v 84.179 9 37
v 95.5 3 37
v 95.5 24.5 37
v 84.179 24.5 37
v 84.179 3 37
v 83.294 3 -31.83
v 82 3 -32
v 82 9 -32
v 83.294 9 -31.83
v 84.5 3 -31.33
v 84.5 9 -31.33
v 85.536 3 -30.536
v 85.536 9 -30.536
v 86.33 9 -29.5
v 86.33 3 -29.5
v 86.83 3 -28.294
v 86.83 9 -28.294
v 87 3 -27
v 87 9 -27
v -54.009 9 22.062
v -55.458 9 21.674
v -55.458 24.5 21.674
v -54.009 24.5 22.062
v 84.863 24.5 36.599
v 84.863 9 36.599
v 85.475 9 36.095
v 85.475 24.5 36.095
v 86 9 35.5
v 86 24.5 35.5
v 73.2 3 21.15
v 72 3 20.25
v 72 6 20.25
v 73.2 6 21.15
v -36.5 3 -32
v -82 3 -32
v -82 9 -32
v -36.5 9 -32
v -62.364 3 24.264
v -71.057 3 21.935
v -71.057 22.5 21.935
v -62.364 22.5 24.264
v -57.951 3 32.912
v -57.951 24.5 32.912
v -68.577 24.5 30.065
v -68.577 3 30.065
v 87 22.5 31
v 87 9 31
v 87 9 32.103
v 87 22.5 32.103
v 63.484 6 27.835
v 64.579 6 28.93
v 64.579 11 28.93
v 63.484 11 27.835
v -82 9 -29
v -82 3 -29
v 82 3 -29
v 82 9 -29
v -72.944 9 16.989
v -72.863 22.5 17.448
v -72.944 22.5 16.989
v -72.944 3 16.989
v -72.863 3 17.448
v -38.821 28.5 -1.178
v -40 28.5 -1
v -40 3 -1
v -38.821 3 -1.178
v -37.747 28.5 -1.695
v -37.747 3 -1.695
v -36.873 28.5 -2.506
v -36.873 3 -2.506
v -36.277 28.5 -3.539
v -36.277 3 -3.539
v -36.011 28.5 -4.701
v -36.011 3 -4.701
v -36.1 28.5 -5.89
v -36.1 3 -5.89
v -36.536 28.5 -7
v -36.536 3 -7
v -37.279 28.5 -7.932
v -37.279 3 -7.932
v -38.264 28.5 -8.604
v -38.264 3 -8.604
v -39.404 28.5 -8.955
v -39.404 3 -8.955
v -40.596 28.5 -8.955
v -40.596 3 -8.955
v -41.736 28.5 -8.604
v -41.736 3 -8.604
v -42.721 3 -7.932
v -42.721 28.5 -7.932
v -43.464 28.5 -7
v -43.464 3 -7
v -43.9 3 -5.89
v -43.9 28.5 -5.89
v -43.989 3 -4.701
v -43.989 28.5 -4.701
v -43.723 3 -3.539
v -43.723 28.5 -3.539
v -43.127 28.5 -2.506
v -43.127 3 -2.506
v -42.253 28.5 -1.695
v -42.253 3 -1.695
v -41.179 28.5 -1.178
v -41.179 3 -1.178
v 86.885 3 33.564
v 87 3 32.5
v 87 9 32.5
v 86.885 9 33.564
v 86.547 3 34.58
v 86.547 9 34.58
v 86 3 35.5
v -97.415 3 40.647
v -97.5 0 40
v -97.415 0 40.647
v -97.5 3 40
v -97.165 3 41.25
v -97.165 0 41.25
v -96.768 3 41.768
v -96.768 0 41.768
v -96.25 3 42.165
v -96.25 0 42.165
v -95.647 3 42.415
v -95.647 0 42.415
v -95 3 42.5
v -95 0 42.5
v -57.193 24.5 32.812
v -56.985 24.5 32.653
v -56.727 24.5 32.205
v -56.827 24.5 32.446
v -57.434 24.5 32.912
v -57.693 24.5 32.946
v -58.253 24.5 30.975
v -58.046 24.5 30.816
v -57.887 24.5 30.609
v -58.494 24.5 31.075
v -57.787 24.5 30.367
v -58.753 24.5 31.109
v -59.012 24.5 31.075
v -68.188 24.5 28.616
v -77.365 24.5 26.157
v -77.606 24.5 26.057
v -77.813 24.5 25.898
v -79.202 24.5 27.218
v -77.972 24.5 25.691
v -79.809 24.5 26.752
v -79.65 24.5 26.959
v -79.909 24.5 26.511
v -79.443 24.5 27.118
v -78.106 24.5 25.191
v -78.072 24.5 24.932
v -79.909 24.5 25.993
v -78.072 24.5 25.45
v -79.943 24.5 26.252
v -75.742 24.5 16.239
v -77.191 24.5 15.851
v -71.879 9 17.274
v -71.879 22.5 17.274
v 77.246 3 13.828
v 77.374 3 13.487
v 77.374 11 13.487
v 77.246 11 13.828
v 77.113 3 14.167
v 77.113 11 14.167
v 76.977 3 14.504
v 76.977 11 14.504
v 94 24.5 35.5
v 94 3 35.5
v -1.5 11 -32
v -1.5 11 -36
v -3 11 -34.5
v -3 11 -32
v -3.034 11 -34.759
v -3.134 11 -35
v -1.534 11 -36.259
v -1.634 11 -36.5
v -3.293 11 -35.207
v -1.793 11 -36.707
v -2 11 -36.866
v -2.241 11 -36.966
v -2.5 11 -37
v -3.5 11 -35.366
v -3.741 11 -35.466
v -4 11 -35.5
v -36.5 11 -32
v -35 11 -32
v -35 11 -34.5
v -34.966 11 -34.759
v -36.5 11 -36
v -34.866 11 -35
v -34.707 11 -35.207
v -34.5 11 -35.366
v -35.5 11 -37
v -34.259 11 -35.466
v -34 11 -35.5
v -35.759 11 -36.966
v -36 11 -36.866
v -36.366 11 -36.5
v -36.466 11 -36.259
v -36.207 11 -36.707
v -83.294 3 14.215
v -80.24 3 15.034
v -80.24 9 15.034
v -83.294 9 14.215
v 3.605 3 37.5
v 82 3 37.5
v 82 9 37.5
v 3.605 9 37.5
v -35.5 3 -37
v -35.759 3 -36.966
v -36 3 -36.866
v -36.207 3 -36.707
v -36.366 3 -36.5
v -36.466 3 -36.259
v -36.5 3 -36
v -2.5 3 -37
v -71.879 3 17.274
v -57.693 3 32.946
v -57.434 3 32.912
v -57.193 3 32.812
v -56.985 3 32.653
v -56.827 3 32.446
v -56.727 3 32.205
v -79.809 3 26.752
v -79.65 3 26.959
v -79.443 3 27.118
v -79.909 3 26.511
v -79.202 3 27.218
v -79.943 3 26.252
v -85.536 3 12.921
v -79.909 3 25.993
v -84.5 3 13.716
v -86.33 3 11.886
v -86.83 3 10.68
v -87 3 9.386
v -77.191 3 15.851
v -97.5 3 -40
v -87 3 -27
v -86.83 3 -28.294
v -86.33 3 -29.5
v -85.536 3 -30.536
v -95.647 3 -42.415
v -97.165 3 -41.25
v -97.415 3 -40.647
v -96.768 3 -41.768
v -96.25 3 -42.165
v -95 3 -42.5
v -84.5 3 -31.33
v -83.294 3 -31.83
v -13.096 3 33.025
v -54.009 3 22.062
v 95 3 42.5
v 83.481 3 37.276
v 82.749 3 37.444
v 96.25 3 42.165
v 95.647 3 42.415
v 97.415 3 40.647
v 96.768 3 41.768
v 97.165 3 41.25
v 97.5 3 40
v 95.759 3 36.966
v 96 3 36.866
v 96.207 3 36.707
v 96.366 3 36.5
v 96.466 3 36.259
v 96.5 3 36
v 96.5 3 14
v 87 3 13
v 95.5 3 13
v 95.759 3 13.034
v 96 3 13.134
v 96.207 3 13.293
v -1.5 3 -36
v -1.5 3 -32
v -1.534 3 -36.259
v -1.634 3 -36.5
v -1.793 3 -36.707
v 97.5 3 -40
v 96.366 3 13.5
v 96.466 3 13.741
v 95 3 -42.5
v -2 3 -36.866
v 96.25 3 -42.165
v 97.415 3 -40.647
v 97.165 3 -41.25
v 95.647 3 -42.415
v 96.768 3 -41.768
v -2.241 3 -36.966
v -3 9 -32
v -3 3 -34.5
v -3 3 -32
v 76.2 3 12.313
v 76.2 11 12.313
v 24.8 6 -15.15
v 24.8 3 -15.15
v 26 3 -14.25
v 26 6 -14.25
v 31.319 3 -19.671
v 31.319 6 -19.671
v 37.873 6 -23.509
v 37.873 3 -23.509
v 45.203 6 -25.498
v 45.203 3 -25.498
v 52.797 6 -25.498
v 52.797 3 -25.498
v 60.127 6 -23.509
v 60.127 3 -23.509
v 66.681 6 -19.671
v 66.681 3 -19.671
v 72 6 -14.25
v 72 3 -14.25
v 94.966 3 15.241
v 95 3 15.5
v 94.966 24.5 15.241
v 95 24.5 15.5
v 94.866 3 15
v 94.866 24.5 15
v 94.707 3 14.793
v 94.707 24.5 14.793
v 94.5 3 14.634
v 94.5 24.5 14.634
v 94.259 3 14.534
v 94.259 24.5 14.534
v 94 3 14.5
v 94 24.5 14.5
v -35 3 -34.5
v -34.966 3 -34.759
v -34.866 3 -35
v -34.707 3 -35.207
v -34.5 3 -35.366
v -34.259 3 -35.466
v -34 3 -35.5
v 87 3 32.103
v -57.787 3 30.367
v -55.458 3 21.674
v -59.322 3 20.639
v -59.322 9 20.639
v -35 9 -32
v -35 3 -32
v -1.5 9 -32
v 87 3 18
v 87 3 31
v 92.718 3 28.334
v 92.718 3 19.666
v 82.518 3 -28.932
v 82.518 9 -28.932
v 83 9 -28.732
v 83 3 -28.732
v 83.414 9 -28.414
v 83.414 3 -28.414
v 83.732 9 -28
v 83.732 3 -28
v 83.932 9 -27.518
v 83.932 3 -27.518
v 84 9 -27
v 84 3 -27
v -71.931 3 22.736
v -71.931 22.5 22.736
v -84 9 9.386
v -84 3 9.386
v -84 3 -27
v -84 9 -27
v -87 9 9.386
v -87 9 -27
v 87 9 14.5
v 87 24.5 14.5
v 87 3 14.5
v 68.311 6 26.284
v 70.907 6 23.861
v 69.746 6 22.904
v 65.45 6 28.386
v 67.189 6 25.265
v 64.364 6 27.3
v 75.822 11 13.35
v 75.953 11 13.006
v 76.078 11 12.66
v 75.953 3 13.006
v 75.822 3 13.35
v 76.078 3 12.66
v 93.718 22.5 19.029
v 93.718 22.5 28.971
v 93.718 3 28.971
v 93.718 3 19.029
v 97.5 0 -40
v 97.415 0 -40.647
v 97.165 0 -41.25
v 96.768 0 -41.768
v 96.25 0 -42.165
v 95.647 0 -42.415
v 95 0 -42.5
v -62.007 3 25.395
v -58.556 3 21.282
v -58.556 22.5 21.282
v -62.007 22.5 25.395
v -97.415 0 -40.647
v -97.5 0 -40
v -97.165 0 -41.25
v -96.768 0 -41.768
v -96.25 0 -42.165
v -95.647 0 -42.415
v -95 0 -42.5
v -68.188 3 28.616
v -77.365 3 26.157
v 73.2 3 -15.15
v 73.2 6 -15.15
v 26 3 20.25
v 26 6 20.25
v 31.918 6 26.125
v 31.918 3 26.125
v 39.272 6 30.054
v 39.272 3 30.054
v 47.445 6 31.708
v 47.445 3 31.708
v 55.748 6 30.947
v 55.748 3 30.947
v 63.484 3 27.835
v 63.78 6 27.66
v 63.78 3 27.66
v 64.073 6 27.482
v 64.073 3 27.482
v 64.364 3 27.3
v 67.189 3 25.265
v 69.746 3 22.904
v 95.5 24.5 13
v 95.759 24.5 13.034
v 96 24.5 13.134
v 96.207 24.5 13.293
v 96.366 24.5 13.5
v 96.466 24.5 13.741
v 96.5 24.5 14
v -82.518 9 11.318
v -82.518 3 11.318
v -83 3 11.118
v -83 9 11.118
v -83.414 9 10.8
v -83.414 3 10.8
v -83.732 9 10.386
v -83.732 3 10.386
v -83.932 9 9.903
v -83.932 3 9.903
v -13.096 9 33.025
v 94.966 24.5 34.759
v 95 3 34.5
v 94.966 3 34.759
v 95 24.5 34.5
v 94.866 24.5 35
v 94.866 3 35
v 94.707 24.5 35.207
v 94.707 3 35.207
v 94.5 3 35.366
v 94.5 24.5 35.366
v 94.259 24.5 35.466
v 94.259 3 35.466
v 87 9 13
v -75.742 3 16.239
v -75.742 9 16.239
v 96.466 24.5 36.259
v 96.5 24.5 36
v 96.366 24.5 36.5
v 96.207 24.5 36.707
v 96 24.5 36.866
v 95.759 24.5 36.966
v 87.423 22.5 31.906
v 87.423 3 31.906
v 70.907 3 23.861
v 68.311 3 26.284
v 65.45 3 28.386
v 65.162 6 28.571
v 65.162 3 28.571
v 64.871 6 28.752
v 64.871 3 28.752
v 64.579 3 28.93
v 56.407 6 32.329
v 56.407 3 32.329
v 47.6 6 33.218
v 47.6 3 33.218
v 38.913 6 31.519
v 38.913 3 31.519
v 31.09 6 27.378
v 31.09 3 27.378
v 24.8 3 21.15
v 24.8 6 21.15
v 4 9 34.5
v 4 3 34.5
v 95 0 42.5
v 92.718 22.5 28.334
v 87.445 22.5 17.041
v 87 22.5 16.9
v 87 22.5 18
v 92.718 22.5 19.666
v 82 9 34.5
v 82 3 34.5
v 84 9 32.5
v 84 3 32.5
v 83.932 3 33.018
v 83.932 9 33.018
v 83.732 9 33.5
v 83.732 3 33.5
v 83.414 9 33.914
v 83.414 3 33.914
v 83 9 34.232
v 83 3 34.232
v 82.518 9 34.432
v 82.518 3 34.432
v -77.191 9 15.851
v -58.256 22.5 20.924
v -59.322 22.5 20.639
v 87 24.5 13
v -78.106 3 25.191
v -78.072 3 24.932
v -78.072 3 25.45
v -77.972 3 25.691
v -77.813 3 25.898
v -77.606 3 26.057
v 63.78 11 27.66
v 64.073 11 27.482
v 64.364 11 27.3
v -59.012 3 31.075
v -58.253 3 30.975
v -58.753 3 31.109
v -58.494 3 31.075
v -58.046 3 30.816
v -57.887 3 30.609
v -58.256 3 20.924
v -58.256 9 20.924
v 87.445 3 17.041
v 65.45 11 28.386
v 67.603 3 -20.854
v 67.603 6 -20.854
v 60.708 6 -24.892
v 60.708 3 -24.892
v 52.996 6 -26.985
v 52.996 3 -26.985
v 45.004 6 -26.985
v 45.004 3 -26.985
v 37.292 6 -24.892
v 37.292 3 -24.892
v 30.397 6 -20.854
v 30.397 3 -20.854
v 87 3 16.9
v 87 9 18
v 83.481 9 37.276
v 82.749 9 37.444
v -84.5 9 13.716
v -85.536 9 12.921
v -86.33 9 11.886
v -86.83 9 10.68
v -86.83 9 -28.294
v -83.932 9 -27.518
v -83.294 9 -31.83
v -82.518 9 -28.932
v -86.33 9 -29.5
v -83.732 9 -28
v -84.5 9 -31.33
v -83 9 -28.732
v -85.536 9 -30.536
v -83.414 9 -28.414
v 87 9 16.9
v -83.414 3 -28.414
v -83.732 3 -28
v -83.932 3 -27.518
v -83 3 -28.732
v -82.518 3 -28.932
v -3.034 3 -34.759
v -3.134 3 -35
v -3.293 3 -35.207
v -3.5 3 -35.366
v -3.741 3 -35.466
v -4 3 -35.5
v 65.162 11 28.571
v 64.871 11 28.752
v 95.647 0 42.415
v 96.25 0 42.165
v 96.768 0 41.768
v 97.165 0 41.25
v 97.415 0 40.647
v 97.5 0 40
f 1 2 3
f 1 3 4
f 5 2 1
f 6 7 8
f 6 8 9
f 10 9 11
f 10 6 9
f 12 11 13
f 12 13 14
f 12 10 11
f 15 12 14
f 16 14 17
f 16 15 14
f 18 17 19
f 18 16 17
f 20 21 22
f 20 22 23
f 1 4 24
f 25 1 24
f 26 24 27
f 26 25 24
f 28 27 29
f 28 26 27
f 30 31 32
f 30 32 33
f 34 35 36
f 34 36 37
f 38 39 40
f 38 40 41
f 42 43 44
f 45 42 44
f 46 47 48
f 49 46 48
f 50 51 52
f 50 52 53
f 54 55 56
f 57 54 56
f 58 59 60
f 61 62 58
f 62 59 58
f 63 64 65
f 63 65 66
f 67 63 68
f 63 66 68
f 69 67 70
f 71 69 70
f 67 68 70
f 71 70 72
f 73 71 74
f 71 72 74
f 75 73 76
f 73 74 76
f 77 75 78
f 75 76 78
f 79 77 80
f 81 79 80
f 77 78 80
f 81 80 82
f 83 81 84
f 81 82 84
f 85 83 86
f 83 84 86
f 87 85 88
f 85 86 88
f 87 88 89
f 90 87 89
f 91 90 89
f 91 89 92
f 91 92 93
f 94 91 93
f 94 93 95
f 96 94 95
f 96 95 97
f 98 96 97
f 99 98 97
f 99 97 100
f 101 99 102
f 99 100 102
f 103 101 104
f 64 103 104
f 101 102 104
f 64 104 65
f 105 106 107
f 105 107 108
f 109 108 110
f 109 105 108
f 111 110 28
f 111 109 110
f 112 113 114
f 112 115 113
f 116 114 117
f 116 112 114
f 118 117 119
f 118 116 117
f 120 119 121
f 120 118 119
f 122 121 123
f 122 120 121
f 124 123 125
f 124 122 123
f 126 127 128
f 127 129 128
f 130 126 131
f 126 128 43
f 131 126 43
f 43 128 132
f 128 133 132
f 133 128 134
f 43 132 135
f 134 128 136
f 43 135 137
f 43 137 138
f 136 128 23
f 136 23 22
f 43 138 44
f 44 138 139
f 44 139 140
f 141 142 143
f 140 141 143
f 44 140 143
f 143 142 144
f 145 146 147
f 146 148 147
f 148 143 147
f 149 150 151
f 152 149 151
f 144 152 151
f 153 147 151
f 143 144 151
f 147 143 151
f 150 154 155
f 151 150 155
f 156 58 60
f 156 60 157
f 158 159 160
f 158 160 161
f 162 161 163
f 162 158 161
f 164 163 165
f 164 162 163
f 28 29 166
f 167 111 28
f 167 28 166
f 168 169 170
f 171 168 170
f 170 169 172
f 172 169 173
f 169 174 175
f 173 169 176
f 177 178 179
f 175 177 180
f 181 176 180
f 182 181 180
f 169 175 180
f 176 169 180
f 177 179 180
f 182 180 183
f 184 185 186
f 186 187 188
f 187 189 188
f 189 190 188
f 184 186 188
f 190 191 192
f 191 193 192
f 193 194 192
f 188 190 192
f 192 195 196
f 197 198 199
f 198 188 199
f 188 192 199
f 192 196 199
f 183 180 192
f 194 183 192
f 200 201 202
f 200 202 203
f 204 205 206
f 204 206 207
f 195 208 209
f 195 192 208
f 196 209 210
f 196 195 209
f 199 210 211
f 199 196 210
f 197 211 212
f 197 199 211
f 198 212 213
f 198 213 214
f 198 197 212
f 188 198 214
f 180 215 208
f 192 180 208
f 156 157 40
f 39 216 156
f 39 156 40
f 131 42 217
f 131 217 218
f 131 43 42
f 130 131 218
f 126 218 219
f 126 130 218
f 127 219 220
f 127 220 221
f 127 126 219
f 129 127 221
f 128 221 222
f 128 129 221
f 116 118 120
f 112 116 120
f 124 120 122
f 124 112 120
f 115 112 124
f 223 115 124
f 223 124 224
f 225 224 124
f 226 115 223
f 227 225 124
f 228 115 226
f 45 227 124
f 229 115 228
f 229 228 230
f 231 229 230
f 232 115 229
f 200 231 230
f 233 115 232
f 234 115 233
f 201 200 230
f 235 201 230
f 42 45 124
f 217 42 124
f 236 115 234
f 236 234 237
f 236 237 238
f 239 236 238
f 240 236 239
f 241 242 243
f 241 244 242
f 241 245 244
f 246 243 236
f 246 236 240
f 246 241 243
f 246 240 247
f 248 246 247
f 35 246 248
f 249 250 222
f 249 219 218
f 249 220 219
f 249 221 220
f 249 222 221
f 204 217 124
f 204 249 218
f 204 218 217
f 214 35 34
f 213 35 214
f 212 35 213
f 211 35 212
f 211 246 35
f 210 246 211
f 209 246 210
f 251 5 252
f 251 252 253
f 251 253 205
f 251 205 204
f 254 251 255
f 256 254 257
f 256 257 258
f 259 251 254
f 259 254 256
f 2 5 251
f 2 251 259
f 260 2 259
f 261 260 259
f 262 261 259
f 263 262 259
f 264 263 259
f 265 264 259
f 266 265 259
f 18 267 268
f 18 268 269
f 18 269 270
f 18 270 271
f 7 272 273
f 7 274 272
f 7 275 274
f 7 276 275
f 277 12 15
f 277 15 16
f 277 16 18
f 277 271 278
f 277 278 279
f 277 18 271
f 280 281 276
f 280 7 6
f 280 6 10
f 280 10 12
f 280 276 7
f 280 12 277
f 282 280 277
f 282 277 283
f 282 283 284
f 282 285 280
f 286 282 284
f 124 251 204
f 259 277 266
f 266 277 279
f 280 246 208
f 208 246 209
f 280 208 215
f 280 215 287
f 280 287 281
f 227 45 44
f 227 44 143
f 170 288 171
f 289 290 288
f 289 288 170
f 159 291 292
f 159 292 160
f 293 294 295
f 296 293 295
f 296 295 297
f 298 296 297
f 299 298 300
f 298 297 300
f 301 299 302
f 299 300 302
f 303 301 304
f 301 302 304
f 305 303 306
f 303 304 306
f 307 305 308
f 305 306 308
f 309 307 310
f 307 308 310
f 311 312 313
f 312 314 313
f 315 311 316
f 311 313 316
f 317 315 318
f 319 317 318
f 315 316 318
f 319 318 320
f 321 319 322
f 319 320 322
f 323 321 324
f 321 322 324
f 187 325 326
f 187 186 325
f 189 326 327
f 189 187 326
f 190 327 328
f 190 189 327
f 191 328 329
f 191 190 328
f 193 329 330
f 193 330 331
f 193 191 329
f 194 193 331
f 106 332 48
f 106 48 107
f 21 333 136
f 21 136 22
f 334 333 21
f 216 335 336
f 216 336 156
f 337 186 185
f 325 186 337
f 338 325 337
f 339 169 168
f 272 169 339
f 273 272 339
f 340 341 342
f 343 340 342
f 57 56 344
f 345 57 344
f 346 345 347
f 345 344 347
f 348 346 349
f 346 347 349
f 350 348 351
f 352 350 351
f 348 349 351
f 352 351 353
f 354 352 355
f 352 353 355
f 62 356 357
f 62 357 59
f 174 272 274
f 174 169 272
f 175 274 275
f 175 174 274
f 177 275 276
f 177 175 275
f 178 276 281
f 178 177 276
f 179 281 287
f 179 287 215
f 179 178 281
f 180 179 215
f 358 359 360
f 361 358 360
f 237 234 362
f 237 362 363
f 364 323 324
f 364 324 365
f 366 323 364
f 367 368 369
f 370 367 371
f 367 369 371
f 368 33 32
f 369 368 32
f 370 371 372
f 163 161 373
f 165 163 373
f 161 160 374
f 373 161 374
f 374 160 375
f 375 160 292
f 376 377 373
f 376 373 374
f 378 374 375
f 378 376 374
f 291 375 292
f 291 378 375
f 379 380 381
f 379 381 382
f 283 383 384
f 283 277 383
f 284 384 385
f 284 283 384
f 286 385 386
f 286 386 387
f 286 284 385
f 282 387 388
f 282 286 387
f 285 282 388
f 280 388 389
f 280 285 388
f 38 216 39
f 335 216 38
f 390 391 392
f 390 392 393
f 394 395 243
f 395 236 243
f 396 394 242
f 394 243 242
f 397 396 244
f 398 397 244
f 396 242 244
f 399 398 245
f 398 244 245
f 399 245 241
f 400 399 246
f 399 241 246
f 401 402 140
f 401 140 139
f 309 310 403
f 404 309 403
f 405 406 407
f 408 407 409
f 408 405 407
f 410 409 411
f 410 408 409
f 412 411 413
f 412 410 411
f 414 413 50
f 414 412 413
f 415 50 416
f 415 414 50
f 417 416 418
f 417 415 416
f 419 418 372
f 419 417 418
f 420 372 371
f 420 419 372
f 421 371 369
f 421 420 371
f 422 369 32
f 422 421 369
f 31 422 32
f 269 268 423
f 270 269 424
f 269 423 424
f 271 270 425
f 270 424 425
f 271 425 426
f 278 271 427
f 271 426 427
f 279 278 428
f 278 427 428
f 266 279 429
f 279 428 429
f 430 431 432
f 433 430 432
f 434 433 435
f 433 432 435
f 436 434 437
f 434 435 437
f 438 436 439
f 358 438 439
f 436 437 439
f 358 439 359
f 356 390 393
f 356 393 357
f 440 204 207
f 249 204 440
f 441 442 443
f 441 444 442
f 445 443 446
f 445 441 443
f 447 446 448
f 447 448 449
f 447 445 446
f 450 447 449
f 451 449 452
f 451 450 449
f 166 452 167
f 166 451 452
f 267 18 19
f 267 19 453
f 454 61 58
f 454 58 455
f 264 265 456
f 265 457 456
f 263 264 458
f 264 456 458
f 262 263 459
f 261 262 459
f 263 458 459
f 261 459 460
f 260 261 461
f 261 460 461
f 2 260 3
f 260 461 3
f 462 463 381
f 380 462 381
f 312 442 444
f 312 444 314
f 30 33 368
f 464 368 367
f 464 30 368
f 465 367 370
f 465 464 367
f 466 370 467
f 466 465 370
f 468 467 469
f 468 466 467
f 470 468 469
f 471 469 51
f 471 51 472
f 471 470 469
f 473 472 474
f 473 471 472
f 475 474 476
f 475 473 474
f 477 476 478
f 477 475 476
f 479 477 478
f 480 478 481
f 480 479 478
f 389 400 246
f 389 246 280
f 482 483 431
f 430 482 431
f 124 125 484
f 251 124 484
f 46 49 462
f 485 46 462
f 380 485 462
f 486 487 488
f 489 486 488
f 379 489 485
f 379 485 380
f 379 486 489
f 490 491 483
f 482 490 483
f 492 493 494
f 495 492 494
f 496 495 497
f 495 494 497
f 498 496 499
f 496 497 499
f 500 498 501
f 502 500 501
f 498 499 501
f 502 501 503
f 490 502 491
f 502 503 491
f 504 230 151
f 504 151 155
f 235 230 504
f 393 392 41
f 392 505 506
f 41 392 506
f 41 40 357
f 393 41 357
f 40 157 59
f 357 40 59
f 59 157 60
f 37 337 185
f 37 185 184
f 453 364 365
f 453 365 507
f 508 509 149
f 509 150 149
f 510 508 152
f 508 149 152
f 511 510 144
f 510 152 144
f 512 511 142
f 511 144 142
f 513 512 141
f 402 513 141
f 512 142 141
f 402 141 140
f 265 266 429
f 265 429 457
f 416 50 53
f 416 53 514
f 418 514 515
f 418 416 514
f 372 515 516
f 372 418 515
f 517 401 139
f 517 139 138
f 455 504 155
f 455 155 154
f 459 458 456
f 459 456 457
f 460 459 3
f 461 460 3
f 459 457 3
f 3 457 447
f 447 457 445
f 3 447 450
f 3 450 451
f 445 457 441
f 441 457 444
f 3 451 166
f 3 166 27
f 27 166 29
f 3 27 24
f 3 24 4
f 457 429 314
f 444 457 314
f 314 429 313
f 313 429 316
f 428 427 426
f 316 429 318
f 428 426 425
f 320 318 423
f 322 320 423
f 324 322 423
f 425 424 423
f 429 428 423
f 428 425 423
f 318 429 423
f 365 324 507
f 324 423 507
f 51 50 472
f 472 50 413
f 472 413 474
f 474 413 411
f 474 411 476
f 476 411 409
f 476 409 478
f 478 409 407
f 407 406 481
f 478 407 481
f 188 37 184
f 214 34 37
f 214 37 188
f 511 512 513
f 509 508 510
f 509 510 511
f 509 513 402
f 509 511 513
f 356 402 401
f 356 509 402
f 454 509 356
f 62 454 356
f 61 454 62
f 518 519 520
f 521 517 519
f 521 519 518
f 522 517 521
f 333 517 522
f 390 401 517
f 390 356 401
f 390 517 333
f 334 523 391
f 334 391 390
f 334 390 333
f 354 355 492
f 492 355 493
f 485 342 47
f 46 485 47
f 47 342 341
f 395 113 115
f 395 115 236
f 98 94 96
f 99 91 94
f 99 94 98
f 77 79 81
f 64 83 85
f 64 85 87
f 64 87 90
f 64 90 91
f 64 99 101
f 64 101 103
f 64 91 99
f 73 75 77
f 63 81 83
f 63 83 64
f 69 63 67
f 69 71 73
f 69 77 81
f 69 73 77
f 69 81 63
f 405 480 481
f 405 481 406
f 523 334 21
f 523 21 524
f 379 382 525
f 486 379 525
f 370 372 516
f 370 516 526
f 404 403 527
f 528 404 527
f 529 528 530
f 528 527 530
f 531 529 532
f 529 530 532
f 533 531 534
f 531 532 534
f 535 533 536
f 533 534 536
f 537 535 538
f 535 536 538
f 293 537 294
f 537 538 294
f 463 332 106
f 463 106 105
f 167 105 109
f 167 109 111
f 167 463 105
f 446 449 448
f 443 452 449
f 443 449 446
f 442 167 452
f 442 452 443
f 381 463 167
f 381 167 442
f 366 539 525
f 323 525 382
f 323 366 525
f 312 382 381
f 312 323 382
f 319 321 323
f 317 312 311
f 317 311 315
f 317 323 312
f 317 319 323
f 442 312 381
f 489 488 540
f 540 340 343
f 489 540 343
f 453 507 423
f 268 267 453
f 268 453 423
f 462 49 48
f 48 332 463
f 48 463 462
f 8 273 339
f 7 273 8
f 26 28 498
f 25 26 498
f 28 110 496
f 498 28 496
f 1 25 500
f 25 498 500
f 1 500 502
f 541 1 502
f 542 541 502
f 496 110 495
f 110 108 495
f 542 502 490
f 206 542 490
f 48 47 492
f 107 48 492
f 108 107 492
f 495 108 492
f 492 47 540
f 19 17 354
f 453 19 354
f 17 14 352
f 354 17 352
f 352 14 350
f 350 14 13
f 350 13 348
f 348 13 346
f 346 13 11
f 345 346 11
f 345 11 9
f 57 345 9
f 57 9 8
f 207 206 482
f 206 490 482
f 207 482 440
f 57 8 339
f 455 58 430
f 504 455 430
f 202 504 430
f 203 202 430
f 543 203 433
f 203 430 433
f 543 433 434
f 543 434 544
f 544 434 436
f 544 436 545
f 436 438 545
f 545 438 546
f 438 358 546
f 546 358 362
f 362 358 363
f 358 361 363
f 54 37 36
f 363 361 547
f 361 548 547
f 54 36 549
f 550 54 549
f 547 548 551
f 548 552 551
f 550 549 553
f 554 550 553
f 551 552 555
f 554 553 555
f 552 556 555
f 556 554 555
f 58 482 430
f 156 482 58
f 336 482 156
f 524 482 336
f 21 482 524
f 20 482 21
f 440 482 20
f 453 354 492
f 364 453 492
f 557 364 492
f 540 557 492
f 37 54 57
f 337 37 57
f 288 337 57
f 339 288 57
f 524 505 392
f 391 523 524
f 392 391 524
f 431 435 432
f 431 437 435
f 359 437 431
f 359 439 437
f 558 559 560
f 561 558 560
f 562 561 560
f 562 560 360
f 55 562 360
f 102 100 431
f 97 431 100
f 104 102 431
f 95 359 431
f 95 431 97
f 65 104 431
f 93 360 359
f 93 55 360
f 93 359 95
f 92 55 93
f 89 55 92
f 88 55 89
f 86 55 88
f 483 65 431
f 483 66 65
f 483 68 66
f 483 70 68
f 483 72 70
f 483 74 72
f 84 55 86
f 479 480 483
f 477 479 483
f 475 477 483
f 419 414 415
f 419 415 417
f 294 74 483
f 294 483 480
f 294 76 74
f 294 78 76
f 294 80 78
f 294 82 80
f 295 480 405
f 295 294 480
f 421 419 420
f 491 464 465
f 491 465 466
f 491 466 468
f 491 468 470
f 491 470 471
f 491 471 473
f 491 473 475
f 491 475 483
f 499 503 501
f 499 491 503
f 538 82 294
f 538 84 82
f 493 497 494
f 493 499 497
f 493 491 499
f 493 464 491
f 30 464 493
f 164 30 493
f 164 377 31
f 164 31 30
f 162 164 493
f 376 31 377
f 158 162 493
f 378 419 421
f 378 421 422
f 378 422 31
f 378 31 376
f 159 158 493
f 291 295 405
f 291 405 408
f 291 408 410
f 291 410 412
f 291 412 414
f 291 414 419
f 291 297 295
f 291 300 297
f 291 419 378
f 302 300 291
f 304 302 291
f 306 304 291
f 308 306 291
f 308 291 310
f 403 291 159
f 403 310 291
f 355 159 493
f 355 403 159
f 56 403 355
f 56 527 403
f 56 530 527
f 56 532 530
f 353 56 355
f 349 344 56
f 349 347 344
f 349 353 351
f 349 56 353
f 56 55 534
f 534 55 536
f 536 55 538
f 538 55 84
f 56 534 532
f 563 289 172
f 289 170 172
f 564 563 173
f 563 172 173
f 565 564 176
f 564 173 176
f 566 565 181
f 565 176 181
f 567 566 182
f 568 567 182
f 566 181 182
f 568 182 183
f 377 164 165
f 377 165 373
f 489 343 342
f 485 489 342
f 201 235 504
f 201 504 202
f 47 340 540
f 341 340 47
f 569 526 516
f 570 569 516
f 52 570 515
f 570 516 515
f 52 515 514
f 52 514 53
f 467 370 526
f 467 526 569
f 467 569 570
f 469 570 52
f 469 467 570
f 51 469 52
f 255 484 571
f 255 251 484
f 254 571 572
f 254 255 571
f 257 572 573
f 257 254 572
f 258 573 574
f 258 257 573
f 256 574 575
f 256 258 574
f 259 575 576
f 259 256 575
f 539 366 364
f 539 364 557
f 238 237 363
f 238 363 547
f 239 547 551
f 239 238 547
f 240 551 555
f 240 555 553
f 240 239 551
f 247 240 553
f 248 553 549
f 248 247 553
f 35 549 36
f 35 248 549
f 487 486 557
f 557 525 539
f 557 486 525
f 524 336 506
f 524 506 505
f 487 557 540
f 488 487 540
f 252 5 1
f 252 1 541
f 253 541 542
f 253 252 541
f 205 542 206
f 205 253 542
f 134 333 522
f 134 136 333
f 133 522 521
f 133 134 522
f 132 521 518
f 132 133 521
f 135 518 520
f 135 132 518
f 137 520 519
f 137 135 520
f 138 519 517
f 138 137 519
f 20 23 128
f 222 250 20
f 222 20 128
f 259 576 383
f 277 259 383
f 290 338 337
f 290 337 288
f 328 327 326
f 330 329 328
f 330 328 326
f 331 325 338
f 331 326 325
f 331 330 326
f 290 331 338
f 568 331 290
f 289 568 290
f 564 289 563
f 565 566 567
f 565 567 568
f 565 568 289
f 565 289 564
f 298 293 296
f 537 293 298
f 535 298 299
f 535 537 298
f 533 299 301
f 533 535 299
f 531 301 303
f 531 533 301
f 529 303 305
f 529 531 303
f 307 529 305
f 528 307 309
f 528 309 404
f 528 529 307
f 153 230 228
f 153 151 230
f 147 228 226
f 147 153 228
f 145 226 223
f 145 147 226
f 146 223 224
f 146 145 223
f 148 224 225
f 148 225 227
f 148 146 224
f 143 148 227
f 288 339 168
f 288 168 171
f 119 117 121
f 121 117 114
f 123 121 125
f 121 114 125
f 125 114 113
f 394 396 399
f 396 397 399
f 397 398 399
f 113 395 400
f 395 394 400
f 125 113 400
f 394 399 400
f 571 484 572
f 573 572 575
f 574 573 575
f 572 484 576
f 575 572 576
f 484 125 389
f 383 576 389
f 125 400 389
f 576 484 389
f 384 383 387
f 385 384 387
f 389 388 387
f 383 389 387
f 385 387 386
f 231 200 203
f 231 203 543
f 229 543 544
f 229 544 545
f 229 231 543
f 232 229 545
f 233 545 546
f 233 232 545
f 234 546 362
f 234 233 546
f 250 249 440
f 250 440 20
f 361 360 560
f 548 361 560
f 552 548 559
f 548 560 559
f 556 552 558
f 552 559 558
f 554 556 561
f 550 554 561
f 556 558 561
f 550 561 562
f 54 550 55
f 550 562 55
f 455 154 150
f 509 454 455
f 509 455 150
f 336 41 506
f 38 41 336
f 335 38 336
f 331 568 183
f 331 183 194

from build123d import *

# Parameters (mm, degrees)
SKETCH1_W           = 195
SKETCH1_H           = 85
BOSS_EXTRUDE1_DEPTH = 3
FILLET1_R           = 2.5
BOSS_EXTRUDE2_DEPTH = 6
BOSS_EXTRUDE3_DEPTH = 8
BOSS_EXTRUDE4_DEPTH = 19.5
BOSS_EXTRUDE5_DEPTH = 21.5
FILLET2_R           = 1
SKETCH7_R           = 4
BOSS_EXTRUDE6_DEPTH = 25.5
BOSS_EXTRUDE7_DEPTH = 3
BOSS_EXTRUDE8_DEPTH = 8


with BuildPart() as part:
    # Sketch1 → Boss-Extrude1 (new body)
    with BuildSketch(Plane(origin=(0, 0, 0), x_dir=(1, 0, 0), z_dir=(0, 1, 0))):
        Rectangle(SKETCH1_W, SKETCH1_H)
    extrude(amount=BOSS_EXTRUDE1_DEPTH)

    # Fillet1
    fillet1_edges = [part.edges().sort_by_distance(p)[0] for p in [
        (97.5, 1.5, 42.5),
        (-97.5, 1.5, 42.5),
        (-97.5, 1.5, -42.5),
        (97.5, 1.5, -42.5),
    ]]
    fillet(fillet1_edges, radius=FILLET1_R)

    # Sketch3 → Boss-Extrude2 (add)
    with BuildSketch(Plane(origin=(0, 3, 0), x_dir=(1, 0, 0), z_dir=(0, 1, 0))):
        with BuildLine():
            Line((82, -37.5), (4, -37.5))
            Line((4, -37.5), (3.605042507, -37.5))
            Line((3.605042507, -37.5), (-13.095926291, -33.024988898))
            Line((-13.095926291, -33.024988898), (-80.24005573, -15.033773638))
            Line((-80.24005573, -15.033773638), (-83.294095226, -14.215446222))
            ThreePointArc((-83.294095226, -14.215446222), (-85.966766701, -12.429624235), (-87, -9.38581709))
            Line((-87, -9.38581709), (-87, 27))
            ThreePointArc((-87, 27), (-85.535533906, 30.535533906), (-82, 32))
            Line((-82, 32), (-81.875932746, 32))
            Line((-81.875932746, 32), (82, 32))
            ThreePointArc((82, 32), (85.535533906, 30.535533906), (87, 27))
            Line((87, 27), (87, -32.5))
            ThreePointArc((87, -32.5), (85.535533906, -36.035533906), (82, -37.5))
        make_face()
        with BuildLine():
            Line((-84, -9.38581709), (-84, 27))
            ThreePointArc((-84, 27), (-83.414213562, 28.414213562), (-82, 29))
            Line((-82, 29), (82, 29))
            ThreePointArc((82, 29), (83.414213562, 28.414213562), (84, 27))
            Line((84, 27), (84, -32.5))
            ThreePointArc((84, -32.5), (83.414213562, -33.914213562), (82, -34.5))
            Line((82, -34.5), (4, -34.5))
            Line((4, -34.5), (-82.51763809, -11.317668743))
            ThreePointArc((-82.51763809, -11.317668743), (-83.586706681, -10.603339948), (-84, -9.38581709))
        make_face(mode=Mode.SUBTRACT)
    extrude(amount=BOSS_EXTRUDE2_DEPTH)

    # Sketch4 → Boss-Extrude3 (add)
    with BuildSketch(Plane(origin=(0, 3, 0), x_dir=(1, 0, 0), z_dir=(0, 1, 0))):
        Polygon((-35, 35.5), (-35, 32), (-36.5, 32), (-36.5, 37), (-3, 37), (-1.5, 37), (-1.5, 32), (-3, 32), (-3, 35.5), align=None)
    extrude(amount=BOSS_EXTRUDE3_DEPTH)

    # Sketch5 → Boss-Extrude4 (add)
    with BuildSketch(Plane(origin=(0, 3, 0), x_dir=(1, 0, 0), z_dir=(0, 1, 0))):
        Polygon((93.717571079, -28.970923081), (93.717571079, -19.029076919), (87.444515609, -17.040885435), (87, -16.9), (87, -18), (92.717571079, -19.66614718), (92.717571079, -28.33385282), (87, -31), (87, -32.103377919), (87.422618262, -31.906307787), align=None)
        Polygon((-71.878679656, -17.274197605), (-71.056906471, -21.934704933), (-62.363574034, -24.264076339), (-59.321643915, -20.638845191), (-58.255862687, -20.92442041), (-58.555599472, -21.281632801), (-62.007030461, -25.394888082), (-71.931088134, -22.735744843), (-72.863487409, -17.447845782), (-72.944460885, -16.988622385), align=None)
    extrude(amount=BOSS_EXTRUDE4_DEPTH)

    # Sketch6 → Boss-Extrude5 (add)
    with BuildSketch(Plane(origin=(0, 3, 0), x_dir=(1, 0, 0), z_dir=(0, 1, 0))):
        with BuildLine():
            Line((95, -35.5), (95, -14.5))
            Line((95, -14.5), (87, -14.5))
            Line((87, -14.5), (87, -13))
            Line((87, -13), (96.5, -13))
            Line((96.5, -13), (96.5, -37))
            Line((96.5, -37), (84.179449472, -37))
            ThreePointArc((84.179449472, -37), (85.179449472, -36.358898944), (86, -35.5))
            Line((86, -35.5), (95, -35.5))
        make_face()
        Polygon((-75.742382962, -16.238921424), (-78.330573413, -25.898179687), (-68.188352237, -28.615779661), (-58.046131061, -31.333379634), (-55.45794061, -21.674121371), (-54.00905187, -22.062349939), (-56.985470889, -33.170496941), (-68.576580804, -30.0646684), (-80.16769072, -26.958839859), (-77.191271701, -15.850692856), align=None)
    extrude(amount=BOSS_EXTRUDE5_DEPTH)

    # Fillet2
    fillet2_edges = [part.edges().sort_by_distance(p)[0] for p in [
        (-1.5, 7, -37),
        (-36.5, 7, -37),
        (-35, 7, -35.5),
        (-3, 7, -35.5),
        (95, 13.75, 14.5),
        (95, 13.75, 35.5),
        (96.5, 13.75, 37),
        (96.5, 13.75, 13),
        (-80.16769072, 13.75, 26.958839859),
        (-56.985470889, 13.75, 33.170496941),
        (-58.046131061, 13.75, 31.333379634),
        (-78.330573413, 13.75, 25.898179687),
    ]]
    fillet(fillet2_edges, radius=FILLET2_R)

    # Sketch7 → Boss-Extrude6 (add)
    with BuildSketch(Plane(origin=(0, 3, 0), x_dir=(1, 0, 0), z_dir=(0, 1, 0))):
        with Locations(Location((-40, 5, 0), (0, 0, 270))):
            Circle(SKETCH7_R)
    extrude(amount=BOSS_EXTRUDE6_DEPTH)

    # Sketch8 → Boss-Extrude7 (add)
    with BuildSketch(Plane(origin=(0, 3, 0), x_dir=(1, 0, 0), z_dir=(0, 1, 0))):
        with BuildLine():
            Line((24.8, 15.15), (26, 14.25))
            ThreePointArc((26, 14.25), (49, 25.75), (72, 14.25))
            Line((72, 14.25), (73.2, 15.15))
            ThreePointArc((73.2, 15.15), (49, 27.25), (24.8, 15.15))
        make_face()
        with BuildLine():
            Line((24.8, -21.15), (26, -20.25))
            ThreePointArc((26, -20.25), (49, -31.75), (72, -20.25))
            Line((72, -20.25), (73.2, -21.15))
            ThreePointArc((73.2, -21.15), (49, -33.25), (24.8, -21.15))
        make_face()
    extrude(amount=BOSS_EXTRUDE7_DEPTH)

    # Sketch9 → Boss-Extrude8 (add)
    with BuildSketch(Plane(origin=(0, 3, 0), x_dir=(1, 0, 0), z_dir=(0, 1, 0))):
        with BuildLine():
            Line((64.363989362, -27.300418327), (65.449871217, -28.386300182))
            ThreePointArc((65.449871217, -28.386300182), (65.016806514, -28.661730438), (64.579131266, -28.929773794))
            Line((64.579131266, -28.929773794), (63.484213314, -27.834855842))
            ThreePointArc((63.484213314, -27.834855842), (63.926493446, -27.571574907), (64.363989362, -27.300418327))
        make_face()
        with BuildLine():
            Line((76.19985084, -12.312927266), (77.373998096, -13.487074522))
            ThreePointArc((77.373998096, -13.487074522), (77.180097488, -13.997481782), (76.977016247, -14.504306235))
            Line((76.977016247, -14.504306235), (75.822470959, -13.349760947))
            ThreePointArc((75.822470959, -13.349760947), (76.016135348, -12.833154674), (76.19985084, -12.312927266))
        make_face()
    extrude(amount=BOSS_EXTRUDE8_DEPTH)


solid = part.part
